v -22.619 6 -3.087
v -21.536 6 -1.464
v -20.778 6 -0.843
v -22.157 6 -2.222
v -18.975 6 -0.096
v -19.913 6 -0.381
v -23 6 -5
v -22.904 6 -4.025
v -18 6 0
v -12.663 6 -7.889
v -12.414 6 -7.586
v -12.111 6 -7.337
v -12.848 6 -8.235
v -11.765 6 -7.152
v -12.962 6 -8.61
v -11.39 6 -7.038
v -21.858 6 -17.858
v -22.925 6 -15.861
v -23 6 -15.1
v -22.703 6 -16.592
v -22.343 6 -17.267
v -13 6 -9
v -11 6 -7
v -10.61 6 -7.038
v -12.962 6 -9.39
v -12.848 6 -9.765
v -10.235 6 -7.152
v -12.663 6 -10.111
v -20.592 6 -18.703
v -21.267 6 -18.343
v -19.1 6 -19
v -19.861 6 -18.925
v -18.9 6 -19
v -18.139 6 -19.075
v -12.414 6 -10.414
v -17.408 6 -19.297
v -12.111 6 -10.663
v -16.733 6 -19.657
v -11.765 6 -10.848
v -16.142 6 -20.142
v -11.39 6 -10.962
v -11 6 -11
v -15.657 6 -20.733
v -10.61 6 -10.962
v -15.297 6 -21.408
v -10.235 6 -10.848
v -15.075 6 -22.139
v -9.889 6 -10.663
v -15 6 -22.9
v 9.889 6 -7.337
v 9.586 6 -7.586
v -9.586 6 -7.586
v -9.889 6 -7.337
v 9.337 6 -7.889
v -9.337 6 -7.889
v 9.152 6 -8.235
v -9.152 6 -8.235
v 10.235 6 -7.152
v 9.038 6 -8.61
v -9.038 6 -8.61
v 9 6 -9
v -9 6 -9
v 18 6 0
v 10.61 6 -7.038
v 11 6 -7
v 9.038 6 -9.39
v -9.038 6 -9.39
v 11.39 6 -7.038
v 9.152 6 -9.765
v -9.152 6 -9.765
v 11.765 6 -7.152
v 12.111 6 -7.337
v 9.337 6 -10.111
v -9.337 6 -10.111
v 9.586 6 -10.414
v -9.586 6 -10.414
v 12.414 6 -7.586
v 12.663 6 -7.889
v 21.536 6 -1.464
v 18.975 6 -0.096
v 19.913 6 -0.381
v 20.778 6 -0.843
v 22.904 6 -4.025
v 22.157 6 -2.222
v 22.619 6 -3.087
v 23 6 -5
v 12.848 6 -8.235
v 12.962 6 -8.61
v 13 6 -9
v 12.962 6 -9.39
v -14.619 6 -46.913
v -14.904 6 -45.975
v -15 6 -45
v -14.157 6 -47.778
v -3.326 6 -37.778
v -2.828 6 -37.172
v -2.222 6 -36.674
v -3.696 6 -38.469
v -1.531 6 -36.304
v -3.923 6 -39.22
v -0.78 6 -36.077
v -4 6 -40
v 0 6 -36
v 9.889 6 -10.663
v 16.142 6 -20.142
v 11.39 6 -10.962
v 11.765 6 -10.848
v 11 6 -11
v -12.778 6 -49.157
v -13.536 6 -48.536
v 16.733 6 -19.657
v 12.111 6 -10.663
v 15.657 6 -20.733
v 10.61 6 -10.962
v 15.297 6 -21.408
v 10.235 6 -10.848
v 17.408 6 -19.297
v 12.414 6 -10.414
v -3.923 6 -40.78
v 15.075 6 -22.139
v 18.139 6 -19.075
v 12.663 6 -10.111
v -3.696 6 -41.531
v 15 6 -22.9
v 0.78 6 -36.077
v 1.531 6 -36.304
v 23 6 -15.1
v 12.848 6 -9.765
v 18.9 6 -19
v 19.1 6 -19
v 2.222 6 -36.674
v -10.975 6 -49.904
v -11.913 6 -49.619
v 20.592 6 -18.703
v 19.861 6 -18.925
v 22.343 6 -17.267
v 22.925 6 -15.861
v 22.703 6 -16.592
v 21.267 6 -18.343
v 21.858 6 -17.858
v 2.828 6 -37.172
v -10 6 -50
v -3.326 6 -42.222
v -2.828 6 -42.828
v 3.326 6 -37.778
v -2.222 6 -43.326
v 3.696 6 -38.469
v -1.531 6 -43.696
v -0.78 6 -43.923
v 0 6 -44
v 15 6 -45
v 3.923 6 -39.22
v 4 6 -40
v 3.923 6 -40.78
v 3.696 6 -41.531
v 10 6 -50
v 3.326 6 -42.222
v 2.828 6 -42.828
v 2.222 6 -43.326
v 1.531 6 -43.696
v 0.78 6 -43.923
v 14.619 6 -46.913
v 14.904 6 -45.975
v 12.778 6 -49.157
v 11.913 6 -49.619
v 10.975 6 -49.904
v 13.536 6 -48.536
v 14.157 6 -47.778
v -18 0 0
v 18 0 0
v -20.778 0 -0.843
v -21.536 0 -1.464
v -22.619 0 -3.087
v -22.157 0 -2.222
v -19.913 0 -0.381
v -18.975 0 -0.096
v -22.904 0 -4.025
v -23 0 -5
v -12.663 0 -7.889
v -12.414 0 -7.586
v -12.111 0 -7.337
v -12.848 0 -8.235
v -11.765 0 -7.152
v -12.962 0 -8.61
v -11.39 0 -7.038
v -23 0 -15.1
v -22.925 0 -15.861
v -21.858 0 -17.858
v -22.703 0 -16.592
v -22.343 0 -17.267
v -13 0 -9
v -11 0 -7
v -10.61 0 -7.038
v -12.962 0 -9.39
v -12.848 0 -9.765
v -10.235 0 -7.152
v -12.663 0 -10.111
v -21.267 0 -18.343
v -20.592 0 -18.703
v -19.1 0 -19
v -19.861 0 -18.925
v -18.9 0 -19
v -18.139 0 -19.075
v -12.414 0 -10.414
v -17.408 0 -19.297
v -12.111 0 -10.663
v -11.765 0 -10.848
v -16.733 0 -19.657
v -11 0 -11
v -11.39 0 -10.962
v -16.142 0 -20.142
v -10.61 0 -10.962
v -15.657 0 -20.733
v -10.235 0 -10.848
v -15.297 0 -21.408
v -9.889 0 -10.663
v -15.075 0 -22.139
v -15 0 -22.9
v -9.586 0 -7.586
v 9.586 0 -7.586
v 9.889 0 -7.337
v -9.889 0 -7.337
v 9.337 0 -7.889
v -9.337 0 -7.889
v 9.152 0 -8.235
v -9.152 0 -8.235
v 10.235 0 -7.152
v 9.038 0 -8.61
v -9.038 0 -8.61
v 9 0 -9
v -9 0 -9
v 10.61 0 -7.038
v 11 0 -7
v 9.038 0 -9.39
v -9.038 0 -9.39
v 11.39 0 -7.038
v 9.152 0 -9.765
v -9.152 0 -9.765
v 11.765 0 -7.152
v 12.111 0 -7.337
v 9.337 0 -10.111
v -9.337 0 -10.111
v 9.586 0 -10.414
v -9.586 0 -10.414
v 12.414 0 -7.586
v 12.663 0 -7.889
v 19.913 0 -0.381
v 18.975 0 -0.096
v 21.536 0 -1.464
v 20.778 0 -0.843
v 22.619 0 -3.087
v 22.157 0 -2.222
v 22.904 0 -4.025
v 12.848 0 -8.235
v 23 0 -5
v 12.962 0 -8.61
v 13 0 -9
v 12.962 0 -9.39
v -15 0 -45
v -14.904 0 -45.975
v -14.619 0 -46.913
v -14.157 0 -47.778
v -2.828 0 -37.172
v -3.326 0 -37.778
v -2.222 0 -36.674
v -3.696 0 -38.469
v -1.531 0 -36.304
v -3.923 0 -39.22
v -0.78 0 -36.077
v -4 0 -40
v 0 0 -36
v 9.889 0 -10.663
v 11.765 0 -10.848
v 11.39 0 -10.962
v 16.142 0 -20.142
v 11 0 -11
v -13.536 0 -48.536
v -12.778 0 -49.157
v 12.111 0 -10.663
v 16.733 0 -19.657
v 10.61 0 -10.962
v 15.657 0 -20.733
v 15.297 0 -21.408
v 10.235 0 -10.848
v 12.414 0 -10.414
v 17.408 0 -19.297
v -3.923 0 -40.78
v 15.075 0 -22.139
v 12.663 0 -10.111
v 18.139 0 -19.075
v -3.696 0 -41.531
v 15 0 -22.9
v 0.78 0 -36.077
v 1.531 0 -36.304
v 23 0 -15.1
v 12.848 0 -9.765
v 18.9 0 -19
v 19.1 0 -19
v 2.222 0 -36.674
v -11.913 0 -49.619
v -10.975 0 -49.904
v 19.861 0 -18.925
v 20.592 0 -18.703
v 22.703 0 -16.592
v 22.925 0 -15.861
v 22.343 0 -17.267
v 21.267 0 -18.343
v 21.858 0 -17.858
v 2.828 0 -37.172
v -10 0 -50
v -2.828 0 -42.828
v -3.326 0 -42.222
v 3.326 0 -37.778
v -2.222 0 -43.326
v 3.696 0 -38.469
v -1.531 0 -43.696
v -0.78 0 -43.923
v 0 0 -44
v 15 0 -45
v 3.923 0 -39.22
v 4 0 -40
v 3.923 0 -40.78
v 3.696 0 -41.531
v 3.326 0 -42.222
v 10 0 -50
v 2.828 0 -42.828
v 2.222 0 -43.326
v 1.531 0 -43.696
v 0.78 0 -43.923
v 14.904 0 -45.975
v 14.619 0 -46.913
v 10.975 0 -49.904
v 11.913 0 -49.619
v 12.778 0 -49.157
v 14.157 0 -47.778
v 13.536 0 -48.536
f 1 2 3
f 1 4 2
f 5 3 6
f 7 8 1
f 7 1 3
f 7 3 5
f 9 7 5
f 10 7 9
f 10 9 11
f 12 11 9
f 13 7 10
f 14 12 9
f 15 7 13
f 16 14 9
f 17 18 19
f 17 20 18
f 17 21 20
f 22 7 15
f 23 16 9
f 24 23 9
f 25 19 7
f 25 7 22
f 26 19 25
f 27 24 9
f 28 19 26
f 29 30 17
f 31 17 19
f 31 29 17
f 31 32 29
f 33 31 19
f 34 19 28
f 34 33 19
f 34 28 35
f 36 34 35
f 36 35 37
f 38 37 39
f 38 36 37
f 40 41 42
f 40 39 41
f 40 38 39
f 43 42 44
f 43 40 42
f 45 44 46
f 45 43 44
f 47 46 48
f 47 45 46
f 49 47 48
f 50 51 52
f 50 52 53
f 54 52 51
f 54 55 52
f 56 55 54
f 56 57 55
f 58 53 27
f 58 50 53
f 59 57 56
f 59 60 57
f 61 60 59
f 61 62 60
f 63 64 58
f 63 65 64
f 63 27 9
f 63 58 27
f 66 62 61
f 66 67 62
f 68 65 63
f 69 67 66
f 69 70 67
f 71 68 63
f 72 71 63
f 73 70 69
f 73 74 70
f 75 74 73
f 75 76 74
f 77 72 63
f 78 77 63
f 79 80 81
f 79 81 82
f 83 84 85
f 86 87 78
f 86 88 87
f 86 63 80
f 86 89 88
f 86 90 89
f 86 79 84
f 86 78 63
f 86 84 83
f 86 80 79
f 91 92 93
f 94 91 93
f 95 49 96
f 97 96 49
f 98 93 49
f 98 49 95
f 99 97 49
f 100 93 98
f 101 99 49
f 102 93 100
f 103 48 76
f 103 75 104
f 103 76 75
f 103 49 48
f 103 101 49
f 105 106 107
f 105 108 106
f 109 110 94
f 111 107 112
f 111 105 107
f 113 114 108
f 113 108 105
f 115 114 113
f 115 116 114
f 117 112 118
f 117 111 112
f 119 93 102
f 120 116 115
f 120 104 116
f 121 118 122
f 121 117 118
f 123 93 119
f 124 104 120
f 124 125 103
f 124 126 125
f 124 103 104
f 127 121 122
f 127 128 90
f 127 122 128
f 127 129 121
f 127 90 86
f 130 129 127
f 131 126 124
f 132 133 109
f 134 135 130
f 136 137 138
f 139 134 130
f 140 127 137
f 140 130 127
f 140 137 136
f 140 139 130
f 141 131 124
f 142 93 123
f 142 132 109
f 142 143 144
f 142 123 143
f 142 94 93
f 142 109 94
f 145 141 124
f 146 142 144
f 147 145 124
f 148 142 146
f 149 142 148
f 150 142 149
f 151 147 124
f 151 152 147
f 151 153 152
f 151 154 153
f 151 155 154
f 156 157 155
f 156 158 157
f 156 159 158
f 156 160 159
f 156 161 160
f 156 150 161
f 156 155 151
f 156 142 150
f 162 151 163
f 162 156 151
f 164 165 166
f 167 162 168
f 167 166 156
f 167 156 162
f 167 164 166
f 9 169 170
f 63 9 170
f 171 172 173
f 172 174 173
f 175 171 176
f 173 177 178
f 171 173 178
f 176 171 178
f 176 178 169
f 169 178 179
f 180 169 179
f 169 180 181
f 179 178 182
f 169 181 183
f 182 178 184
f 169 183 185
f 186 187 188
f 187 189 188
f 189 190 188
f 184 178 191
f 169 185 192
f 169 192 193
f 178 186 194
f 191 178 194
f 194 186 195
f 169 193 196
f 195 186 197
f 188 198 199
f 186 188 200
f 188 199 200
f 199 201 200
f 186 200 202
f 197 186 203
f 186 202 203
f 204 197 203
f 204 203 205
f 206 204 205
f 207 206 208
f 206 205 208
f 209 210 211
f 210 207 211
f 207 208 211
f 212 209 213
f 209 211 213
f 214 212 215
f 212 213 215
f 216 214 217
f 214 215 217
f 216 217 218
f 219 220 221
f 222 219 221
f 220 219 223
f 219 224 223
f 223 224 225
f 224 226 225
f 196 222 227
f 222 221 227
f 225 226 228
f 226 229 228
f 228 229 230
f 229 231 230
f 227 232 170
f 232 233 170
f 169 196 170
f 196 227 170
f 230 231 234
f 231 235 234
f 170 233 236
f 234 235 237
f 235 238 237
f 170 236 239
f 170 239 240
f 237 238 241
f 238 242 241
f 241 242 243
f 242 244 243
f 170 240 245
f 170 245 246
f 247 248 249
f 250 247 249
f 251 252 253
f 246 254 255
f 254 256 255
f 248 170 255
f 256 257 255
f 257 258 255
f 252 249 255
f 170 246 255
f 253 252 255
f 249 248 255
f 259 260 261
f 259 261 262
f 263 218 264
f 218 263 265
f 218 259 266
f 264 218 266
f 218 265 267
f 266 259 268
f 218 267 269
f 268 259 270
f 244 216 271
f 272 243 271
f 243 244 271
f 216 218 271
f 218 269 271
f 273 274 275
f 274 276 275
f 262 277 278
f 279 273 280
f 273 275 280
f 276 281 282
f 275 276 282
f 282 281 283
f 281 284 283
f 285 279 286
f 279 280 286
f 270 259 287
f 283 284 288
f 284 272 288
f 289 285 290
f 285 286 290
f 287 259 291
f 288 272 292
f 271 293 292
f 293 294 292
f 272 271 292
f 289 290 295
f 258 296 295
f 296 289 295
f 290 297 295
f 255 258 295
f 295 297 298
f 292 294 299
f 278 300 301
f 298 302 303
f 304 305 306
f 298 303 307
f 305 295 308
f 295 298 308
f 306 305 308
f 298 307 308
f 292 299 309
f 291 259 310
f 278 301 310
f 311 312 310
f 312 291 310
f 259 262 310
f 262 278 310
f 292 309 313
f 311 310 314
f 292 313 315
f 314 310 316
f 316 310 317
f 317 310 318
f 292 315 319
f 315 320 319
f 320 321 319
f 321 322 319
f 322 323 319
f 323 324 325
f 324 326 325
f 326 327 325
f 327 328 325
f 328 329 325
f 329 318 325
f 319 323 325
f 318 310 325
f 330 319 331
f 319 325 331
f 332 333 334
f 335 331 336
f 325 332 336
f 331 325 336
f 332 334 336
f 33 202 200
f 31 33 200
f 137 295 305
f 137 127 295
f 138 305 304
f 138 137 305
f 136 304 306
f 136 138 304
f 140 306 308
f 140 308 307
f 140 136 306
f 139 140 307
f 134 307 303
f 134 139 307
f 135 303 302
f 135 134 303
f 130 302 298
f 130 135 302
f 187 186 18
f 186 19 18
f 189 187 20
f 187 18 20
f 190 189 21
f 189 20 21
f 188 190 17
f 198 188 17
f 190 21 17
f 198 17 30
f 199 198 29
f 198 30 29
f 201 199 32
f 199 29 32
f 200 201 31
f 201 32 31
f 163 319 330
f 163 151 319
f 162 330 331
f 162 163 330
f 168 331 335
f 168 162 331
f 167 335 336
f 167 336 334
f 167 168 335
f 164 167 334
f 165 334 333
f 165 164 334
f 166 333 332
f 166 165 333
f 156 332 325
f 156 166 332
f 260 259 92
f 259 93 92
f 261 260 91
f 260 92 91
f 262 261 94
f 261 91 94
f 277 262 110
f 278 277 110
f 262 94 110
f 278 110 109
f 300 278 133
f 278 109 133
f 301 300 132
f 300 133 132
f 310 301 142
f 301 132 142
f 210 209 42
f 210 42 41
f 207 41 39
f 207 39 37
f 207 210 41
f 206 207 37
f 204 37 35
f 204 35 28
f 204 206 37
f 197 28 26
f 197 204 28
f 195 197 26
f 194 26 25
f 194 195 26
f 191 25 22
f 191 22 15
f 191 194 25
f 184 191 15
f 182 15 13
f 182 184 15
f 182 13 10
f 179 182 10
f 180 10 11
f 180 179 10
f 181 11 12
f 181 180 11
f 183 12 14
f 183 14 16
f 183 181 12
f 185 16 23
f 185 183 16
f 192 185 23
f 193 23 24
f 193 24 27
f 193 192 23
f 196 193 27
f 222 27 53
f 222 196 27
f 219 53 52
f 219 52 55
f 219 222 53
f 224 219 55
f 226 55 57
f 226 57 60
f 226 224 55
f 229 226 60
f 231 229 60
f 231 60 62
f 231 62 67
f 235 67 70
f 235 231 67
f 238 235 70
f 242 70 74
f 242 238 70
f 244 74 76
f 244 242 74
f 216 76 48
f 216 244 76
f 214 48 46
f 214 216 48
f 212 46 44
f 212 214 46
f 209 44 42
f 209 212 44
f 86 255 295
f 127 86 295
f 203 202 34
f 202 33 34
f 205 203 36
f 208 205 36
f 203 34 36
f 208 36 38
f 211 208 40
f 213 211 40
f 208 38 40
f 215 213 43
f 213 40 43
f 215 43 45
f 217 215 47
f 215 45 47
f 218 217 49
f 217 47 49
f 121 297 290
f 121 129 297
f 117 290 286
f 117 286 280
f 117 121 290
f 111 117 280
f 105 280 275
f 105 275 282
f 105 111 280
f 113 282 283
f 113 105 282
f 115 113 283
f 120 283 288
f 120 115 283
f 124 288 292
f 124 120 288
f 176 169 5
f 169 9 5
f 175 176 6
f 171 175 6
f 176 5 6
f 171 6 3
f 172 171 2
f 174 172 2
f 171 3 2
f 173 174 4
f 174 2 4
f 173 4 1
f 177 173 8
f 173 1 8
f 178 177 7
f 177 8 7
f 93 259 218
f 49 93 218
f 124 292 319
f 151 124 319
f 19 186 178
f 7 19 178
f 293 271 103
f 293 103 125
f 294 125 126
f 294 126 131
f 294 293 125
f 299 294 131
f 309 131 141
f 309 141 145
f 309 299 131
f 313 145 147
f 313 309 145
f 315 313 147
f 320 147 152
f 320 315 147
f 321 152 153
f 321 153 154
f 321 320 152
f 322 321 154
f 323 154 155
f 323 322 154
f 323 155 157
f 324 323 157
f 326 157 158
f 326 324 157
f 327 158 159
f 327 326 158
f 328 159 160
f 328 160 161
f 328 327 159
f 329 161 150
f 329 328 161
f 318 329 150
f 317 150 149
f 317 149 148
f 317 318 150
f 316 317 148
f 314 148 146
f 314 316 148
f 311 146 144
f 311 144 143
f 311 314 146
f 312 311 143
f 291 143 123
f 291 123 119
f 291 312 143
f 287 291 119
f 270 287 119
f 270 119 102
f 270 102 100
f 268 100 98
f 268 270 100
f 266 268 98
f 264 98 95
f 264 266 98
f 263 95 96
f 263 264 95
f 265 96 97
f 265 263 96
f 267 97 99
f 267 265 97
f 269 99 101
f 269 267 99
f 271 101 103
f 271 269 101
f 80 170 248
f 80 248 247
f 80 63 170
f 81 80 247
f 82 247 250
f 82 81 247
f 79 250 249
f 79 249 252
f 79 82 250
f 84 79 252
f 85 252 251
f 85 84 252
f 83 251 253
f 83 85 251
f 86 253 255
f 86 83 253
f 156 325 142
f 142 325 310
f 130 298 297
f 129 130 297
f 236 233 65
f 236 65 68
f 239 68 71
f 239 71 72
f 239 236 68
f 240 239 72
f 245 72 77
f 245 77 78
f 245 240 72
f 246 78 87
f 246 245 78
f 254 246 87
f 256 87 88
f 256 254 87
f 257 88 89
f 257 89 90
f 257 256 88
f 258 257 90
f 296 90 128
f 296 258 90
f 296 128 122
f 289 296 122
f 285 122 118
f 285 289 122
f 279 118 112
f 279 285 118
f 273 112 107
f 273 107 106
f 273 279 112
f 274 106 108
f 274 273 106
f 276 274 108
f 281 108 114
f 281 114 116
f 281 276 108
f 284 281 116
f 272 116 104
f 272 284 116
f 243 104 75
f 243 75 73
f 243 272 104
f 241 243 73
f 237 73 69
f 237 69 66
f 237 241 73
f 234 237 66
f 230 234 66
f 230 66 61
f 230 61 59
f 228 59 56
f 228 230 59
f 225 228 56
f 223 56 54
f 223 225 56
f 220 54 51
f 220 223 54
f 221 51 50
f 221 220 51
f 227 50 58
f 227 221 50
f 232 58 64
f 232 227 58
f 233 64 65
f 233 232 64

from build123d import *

# Parameters (mm, degrees)
SKETCH1_R           = 4
SKETCH1_R_2         = 2
BOSS_EXTRUDE1_DEPTH = 6
FILLET2_R           = 5
FILLET3_R           = 3.9


with BuildPart() as part:
    # Sketch1 → Boss-Extrude1 (new body)
    with BuildSketch(Plane(origin=(0, 0, 0), x_dir=(1, 0, 0), z_dir=(0, 1, 0))):
        Polygon((-23, 0), (23, 0), (23, 19), (15, 19), (15, 50), (-15, 50), (-15, 19), (-23, 19), align=None)
        with Locations(Location((0, 40, 0), (0, 0, 270))):
            Circle(SKETCH1_R, mode=Mode.SUBTRACT)
        with Locations(Location((11, 9, 0), (0, 0, 270))):
            Circle(SKETCH1_R_2, mode=Mode.SUBTRACT)
        with Locations(Location((-11, 9, 0), (0, 0, 90))):
            Circle(SKETCH1_R_2, mode=Mode.SUBTRACT)
    extrude(amount=BOSS_EXTRUDE1_DEPTH)

    # Fillet2
    fillet2_edges = [part.edges().sort_by_distance(p)[0] for p in [
        (15, 3, -50),
        (23, 3, 0),
        (-23, 3, 0),
        (-15, 3, -50),
    ]]
    fillet(fillet2_edges, radius=FILLET2_R)

    # Fillet3
    fillet3_edges = [part.edges().sort_by_distance(p)[0] for p in [
        (15, 3, -19),
        (23, 3, -19),
        (-23, 3, -19),
        (-15, 3, -19),
    ]]
    fillet(fillet3_edges, radius=FILLET3_R)


solid = part.part
